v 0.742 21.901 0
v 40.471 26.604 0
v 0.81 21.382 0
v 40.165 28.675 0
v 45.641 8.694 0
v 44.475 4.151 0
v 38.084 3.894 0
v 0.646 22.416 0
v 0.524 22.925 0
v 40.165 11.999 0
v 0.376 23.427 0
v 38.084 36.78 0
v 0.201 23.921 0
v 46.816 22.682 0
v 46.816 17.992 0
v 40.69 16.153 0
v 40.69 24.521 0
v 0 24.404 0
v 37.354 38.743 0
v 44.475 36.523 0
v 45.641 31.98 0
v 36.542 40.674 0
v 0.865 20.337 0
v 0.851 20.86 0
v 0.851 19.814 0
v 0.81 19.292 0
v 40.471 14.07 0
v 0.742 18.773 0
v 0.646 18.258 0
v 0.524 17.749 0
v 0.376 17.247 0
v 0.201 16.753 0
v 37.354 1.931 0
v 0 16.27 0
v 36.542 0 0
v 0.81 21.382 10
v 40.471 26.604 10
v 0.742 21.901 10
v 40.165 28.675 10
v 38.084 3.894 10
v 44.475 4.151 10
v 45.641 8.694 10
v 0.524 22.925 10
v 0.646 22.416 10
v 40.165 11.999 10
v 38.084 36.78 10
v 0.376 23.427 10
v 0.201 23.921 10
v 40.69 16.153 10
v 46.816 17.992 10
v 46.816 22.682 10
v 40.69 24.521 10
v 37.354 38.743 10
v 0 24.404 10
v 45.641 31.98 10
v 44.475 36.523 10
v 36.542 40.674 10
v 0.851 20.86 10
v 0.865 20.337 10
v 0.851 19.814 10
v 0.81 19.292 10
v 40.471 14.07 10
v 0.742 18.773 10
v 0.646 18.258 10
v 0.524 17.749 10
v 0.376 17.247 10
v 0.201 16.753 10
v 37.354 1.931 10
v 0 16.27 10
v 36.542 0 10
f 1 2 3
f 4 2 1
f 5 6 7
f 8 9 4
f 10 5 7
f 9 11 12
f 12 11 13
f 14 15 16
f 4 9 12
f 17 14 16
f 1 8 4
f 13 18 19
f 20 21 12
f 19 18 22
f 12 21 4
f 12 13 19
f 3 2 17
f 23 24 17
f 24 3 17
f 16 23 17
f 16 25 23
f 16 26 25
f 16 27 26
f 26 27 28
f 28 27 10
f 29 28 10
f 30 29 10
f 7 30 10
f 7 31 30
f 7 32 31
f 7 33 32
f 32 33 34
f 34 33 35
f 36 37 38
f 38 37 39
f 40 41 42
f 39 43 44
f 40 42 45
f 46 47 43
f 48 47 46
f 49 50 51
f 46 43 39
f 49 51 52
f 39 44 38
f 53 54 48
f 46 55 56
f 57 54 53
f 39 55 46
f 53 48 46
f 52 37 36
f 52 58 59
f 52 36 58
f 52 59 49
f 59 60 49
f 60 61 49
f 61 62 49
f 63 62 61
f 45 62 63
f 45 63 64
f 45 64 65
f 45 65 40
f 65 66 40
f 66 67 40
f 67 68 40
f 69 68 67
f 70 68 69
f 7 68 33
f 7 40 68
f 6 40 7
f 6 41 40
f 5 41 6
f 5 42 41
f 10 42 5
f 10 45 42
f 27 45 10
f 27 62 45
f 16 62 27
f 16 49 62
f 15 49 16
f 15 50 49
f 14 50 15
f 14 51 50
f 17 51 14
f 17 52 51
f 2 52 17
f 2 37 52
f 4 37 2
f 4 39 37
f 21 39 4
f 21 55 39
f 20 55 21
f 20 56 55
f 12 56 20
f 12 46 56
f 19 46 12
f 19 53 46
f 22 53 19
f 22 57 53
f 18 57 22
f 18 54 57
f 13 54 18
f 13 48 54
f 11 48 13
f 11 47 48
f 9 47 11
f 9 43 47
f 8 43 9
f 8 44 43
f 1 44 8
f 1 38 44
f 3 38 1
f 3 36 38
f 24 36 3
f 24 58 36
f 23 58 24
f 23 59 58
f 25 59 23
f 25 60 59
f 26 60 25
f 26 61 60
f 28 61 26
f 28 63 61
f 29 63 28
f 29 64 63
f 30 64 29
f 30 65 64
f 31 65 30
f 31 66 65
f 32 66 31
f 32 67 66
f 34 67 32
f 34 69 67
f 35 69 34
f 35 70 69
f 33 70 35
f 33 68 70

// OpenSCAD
$fn = 32;

// ----------------------------------------------------------------------
// Gear sector: 3 teeth on 48 degrees
// ----------------------------------------------------------------------

// --- parameters (mm) ---
sector_angle = 48;        // sector angle, degrees
root_r = 50;              // root circle radius
tooth_h = 6;              // tooth height over the root circle
teeth = 3;                // number of teeth on the sector
hub_r = 10;               // hub bore radius
plate_t = 10;             // sector thickness, Z
arc_step = 3;             // sampling step of the root/hub arcs, degrees

tip_r = root_r + tooth_h;  // tip circle radius

profile = [[36.542, 0], [37.354, 1.931], [38.084, 3.894], [44.475, 4.151], [45.641, 8.694], [40.165, 11.999], [40.471, 14.07], [40.69, 16.153], [46.816, 17.992], [46.816, 22.682], [40.69, 24.521], [40.471, 26.604], [40.165, 28.675], [45.641, 31.98], [44.475, 36.523], [38.084, 36.78], [37.354, 38.743], [36.542, 40.674], [0, 24.404], [0.201, 23.921], [0.376, 23.427], [0.524, 22.925], [0.646, 22.416], [0.742, 21.901], [0.81, 21.382], [0.851, 20.86], [0.865, 20.337], [0.851, 19.814], [0.81, 19.292], [0.742, 18.773], [0.646, 18.258], [0.524, 17.749], [0.376, 17.247], [0.201, 16.753], [0, 16.27]];  // primary outline, 35 points, counter clockwise

// --- the one profile operation ---
linear_extrude(height = plate_t) polygon(points = profile);
